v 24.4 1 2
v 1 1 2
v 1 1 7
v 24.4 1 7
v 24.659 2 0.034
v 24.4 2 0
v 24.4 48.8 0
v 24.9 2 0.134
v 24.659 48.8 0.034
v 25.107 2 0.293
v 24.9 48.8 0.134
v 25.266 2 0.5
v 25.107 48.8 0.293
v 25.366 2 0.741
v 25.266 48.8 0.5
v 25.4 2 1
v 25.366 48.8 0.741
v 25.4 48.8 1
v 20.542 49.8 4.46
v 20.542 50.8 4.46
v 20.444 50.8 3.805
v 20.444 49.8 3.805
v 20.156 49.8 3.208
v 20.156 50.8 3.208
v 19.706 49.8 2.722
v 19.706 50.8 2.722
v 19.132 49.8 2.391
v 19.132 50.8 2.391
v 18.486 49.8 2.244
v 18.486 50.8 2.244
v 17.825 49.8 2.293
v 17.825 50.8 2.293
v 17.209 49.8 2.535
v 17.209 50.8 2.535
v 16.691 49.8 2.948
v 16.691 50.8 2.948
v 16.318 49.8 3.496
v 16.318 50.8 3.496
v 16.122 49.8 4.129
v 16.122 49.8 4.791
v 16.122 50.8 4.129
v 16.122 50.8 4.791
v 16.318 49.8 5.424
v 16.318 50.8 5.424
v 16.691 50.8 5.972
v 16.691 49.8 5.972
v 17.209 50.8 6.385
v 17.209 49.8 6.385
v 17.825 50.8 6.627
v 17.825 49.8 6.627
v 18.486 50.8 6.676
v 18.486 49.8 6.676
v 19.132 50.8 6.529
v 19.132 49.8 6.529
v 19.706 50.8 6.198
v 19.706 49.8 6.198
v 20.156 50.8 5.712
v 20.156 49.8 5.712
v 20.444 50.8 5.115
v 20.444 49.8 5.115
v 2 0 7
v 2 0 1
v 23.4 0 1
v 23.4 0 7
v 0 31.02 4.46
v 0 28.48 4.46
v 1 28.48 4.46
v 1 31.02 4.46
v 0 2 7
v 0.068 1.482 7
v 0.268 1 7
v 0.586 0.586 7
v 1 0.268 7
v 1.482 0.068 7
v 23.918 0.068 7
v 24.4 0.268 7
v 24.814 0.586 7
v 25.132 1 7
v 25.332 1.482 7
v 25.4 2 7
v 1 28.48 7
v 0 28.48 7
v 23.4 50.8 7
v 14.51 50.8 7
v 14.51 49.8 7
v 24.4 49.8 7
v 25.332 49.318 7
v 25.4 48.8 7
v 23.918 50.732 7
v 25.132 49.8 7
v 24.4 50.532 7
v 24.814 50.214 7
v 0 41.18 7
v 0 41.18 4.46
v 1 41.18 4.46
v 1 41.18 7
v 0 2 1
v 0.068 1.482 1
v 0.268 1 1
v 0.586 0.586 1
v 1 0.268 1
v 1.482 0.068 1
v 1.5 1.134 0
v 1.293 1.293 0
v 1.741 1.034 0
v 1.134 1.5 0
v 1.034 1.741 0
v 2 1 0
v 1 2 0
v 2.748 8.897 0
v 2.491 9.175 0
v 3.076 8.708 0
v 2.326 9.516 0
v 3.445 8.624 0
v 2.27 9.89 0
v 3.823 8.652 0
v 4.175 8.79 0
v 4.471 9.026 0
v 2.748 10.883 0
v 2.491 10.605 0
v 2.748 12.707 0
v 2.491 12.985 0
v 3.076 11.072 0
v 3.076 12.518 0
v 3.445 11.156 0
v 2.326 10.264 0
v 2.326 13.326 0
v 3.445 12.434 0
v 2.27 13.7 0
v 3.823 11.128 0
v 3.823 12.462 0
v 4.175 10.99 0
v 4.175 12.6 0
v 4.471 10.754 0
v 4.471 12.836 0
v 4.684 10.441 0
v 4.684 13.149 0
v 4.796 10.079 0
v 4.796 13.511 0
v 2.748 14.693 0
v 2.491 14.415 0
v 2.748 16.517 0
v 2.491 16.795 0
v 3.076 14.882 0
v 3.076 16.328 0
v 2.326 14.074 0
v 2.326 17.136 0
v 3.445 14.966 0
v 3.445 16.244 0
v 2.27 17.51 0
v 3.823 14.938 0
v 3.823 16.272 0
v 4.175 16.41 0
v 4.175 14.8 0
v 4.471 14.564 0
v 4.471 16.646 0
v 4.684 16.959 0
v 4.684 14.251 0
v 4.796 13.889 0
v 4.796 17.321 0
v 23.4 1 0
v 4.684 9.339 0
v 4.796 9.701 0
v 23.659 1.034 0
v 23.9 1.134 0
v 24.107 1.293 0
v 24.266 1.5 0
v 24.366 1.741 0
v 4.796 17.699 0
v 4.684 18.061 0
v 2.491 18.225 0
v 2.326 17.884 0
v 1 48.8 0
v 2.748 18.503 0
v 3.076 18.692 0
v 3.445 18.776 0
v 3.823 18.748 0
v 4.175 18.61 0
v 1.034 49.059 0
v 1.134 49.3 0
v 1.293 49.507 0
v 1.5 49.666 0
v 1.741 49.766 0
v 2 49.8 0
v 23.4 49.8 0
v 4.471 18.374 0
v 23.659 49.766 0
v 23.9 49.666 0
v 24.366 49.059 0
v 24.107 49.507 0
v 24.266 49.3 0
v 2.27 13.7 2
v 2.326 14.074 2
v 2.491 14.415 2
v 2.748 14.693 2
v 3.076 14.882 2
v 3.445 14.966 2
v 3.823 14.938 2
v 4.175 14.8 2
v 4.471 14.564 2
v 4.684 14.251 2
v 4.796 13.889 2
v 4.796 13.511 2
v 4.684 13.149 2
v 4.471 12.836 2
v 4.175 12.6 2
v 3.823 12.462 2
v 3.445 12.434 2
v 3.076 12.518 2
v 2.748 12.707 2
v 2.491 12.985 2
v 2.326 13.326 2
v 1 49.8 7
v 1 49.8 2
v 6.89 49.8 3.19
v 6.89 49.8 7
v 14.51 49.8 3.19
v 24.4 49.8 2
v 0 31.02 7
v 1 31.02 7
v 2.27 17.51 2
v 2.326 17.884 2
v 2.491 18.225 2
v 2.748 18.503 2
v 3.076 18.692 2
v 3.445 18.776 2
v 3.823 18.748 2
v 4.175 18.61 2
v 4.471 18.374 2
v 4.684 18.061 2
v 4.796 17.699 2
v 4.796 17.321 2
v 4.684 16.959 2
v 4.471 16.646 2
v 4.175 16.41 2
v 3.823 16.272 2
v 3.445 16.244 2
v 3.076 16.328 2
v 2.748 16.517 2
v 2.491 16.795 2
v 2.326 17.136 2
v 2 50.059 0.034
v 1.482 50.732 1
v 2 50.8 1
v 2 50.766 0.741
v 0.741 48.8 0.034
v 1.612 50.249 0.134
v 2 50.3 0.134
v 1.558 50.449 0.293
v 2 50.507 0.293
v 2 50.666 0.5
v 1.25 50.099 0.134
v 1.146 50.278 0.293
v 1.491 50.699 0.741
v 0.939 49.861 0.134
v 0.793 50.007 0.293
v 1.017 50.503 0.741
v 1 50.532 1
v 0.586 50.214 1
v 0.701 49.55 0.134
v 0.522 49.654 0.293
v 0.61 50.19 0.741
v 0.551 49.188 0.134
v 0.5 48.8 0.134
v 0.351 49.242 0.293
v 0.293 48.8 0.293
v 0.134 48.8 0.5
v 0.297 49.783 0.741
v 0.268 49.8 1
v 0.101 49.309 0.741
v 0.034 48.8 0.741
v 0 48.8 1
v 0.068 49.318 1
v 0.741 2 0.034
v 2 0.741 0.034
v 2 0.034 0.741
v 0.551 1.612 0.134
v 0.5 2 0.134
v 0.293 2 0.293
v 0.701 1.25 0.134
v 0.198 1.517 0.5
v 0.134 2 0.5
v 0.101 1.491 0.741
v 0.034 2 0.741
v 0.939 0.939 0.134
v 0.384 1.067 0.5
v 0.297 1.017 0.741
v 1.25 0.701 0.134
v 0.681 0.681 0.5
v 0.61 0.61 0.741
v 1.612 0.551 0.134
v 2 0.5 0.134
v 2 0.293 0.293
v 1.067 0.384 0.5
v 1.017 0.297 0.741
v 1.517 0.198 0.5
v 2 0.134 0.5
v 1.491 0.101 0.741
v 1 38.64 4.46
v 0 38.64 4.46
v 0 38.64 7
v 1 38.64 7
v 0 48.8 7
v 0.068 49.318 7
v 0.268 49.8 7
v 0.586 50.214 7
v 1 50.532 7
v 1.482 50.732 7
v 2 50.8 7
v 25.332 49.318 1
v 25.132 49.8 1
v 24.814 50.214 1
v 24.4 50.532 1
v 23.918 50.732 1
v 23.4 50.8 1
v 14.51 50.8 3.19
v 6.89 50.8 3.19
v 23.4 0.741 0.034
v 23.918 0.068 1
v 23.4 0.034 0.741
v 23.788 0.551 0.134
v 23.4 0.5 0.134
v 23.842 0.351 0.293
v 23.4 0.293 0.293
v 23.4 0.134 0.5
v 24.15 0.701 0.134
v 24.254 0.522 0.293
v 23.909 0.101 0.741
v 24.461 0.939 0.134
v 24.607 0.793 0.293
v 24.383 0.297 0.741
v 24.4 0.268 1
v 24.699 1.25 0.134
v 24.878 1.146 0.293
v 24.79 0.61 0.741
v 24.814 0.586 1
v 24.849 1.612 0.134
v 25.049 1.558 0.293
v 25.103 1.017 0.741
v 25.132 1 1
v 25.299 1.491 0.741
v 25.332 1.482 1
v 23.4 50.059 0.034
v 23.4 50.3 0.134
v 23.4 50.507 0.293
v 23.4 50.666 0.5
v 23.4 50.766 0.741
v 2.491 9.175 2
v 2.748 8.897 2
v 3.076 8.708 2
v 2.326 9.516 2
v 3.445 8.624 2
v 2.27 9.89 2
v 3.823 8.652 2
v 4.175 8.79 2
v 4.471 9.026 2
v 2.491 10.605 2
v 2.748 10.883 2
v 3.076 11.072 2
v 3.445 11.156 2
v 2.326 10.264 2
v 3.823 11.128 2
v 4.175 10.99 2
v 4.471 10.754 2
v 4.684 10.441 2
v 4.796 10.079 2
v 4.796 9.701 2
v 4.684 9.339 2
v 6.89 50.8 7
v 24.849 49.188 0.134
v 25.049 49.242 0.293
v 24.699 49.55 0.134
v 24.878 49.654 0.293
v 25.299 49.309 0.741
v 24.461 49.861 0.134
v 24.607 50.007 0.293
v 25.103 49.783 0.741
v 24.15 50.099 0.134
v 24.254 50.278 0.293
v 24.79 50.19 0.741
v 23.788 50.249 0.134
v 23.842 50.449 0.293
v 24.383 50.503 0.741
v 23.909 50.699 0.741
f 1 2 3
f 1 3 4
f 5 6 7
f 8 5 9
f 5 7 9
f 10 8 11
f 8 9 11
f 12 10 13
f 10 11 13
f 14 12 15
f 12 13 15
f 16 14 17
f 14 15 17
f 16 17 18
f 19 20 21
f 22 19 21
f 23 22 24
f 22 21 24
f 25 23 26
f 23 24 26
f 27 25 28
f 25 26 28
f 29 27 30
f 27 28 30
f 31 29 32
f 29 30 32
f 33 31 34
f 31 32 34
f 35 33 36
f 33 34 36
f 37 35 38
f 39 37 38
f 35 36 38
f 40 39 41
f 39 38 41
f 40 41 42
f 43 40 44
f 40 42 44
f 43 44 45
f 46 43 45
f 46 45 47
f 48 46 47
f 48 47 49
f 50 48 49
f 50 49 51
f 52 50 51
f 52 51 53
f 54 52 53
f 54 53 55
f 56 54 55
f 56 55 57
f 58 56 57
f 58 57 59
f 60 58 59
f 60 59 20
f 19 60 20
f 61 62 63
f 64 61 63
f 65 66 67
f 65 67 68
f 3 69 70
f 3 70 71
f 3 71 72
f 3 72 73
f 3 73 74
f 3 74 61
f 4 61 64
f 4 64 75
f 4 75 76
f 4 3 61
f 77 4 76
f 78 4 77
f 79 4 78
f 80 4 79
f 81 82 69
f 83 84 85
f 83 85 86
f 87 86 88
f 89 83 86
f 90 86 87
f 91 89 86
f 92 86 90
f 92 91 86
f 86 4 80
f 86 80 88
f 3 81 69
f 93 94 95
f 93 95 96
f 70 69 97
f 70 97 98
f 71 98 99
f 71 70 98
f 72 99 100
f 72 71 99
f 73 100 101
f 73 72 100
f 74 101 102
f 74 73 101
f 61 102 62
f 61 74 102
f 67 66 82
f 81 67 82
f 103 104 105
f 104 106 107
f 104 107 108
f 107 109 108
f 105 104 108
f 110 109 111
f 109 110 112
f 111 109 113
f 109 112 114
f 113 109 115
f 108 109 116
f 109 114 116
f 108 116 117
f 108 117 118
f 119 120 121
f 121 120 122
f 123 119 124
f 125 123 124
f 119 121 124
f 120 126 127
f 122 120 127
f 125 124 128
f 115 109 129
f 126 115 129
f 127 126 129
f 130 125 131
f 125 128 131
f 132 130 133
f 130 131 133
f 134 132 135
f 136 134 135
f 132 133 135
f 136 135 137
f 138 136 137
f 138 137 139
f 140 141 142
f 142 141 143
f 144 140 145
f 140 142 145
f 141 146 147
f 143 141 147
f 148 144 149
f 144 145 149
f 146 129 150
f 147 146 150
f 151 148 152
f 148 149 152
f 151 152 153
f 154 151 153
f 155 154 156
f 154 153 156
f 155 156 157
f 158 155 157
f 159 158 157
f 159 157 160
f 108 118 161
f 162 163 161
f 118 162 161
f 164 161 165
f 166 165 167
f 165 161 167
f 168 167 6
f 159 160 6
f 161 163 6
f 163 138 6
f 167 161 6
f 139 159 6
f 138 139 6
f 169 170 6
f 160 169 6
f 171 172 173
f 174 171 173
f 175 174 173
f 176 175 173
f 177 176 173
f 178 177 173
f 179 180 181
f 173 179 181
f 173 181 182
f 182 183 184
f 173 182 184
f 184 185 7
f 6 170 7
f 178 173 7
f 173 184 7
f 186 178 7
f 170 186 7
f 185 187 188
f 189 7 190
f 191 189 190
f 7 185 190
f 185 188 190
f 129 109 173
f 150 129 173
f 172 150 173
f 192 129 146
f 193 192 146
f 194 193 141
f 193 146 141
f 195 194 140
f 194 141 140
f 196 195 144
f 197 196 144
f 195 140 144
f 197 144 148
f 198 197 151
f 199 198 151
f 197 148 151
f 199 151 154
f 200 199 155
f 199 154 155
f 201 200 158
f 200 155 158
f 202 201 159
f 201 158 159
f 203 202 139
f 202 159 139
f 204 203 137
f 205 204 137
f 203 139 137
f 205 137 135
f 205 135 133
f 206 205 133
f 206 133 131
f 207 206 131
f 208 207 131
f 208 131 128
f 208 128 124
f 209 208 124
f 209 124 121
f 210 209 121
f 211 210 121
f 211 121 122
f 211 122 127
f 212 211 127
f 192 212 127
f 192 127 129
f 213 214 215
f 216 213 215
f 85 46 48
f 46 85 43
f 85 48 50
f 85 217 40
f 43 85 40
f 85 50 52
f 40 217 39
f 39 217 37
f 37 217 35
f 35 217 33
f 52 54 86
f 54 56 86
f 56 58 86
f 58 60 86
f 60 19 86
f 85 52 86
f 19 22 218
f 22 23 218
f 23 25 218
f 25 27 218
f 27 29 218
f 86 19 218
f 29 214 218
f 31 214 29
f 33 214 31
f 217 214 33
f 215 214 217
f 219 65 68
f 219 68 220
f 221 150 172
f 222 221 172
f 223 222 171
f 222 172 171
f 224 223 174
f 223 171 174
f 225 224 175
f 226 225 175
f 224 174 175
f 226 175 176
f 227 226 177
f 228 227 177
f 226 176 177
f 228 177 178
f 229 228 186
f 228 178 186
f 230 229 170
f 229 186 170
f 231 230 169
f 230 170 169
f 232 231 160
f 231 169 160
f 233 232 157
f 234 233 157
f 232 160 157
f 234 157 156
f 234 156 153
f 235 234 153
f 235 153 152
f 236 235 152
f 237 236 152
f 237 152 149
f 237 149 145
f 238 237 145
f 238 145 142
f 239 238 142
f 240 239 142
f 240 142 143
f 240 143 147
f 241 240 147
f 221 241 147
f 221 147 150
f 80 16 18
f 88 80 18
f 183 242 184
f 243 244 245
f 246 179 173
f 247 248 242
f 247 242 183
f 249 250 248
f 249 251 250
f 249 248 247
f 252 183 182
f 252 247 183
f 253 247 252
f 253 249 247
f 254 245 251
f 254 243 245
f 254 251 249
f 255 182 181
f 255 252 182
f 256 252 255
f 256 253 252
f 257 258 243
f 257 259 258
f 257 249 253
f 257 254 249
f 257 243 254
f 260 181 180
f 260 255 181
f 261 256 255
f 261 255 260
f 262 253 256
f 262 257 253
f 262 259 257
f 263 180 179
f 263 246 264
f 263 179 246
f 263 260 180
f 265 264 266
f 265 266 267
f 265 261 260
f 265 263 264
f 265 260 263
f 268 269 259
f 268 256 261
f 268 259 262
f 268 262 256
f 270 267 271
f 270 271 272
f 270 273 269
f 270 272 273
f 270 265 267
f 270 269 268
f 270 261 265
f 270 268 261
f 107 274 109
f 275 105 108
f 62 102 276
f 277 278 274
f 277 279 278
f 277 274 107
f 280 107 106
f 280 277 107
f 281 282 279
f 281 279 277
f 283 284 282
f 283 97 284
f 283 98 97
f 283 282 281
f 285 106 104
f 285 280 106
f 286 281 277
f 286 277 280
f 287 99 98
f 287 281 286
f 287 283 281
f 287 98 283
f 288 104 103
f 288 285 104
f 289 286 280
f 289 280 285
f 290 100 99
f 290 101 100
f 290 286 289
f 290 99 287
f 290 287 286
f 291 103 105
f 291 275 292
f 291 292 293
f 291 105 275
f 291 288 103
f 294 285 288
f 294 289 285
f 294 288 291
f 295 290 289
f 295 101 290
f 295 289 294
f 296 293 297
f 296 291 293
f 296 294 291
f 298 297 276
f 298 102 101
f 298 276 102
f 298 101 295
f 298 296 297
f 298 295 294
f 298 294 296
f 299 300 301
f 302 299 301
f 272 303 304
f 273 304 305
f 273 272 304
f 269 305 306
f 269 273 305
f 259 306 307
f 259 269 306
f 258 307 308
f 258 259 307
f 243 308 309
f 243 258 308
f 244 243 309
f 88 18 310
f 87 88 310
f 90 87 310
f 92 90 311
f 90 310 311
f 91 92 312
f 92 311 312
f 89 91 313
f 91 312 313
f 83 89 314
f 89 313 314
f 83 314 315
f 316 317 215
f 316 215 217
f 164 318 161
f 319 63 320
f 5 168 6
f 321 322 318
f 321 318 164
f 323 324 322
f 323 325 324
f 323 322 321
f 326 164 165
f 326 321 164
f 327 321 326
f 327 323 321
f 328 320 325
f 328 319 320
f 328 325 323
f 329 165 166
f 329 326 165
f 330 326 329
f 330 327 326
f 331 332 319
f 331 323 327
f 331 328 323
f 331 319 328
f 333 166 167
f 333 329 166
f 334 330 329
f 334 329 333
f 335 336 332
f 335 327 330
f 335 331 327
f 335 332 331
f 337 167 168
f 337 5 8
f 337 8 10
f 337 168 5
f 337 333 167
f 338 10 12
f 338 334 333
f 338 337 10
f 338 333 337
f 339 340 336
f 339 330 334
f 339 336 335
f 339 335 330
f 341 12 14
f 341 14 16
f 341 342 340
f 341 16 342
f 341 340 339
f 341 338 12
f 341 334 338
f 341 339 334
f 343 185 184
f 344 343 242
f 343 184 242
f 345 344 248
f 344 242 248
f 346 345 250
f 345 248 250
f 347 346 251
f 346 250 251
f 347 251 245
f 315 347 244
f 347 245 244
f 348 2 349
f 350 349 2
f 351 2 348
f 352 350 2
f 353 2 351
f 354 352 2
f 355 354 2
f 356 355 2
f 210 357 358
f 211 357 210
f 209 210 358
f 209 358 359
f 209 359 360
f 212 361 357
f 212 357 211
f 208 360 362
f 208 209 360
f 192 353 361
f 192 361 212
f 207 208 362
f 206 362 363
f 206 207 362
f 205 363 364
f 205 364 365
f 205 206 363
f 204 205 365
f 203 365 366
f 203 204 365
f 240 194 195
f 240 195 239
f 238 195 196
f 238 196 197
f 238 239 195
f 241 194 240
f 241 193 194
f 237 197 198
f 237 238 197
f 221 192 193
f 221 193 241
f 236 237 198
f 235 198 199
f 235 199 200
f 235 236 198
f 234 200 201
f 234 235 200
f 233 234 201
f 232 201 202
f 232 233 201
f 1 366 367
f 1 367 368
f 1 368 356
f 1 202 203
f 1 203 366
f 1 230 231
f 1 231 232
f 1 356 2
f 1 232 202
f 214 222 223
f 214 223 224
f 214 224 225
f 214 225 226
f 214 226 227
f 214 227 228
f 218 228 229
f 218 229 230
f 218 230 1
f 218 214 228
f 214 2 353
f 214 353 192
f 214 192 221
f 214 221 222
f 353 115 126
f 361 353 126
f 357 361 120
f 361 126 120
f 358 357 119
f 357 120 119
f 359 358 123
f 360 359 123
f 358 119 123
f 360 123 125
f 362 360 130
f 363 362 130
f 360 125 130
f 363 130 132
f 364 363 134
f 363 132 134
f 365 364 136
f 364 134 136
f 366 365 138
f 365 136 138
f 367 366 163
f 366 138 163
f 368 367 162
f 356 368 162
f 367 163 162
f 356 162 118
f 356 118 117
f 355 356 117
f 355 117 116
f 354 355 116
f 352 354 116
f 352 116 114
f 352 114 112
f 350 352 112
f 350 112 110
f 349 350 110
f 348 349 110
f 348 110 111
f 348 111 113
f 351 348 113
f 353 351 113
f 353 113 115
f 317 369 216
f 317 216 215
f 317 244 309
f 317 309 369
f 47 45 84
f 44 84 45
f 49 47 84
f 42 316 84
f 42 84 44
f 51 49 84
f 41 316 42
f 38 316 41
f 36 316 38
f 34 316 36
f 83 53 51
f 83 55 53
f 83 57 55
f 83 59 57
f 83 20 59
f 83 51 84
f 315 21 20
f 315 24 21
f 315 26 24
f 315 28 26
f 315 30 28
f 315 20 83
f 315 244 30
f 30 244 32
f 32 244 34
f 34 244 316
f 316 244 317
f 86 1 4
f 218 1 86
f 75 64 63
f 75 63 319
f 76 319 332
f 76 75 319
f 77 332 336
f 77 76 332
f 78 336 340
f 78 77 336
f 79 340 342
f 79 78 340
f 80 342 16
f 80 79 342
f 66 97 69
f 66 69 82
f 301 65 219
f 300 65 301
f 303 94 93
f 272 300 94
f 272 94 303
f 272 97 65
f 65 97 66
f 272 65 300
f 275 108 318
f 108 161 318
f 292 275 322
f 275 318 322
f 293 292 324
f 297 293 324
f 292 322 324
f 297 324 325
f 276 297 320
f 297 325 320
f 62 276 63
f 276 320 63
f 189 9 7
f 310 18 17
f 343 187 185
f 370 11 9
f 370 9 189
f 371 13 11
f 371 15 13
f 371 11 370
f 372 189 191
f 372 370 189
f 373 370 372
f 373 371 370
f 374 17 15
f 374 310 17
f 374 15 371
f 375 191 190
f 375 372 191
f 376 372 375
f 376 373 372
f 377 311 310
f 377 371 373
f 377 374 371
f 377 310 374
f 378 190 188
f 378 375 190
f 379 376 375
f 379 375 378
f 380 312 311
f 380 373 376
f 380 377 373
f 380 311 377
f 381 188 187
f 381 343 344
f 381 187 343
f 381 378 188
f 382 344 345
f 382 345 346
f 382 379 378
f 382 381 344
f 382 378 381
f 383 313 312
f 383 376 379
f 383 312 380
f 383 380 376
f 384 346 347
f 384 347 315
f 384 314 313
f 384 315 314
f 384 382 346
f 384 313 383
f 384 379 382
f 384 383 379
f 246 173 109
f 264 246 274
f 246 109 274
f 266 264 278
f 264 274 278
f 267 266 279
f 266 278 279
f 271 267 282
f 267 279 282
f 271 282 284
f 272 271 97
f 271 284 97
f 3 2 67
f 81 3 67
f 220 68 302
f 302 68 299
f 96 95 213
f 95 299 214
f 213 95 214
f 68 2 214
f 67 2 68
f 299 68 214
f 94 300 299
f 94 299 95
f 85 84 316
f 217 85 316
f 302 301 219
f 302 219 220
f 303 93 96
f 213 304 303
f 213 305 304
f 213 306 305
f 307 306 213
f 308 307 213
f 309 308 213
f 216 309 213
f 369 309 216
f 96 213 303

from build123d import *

# Parameters (mm, degrees)
SKETCH1_W           = 25.4
SKETCH1_H           = 50.8
BOSS_EXTRUDE1_DEPTH = 2.00000108
SKETCH2_W           = 25.4
SKETCH2_H           = 50.8
SKETCH2_W_2         = 23.39999892
SKETCH2_H_2         = 48.79999892
BOSS_EXTRUDE2_DEPTH = 4.999999906
FILLET1_R           = 2.000000064
FILLET2_R           = 1.000000032
CUT_EXTRUDE3_REACH  = 52.8
SKETCH6_R           = 2.2225
CUT_EXTRUDE4_REACH  = 52.8
SKETCH7_W           = 7.62
SKETCH7_H           = 3.81
CUT_EXTRUDE5_REACH  = 27.4
SKETCH8_W           = 2.54
SKETCH8_H           = 2.54
CUT_EXTRUDE6_REACH  = 9
SKETCH9_R           = 1.27


with BuildPart() as part:
    # Sketch1 → Boss-Extrude1 (new body)
    with BuildSketch(Plane.XY):
        with Locations((12.7, 25.4)):
            Rectangle(SKETCH1_W, SKETCH1_H)
    extrude(amount=BOSS_EXTRUDE1_DEPTH)

    # Sketch2 → Boss-Extrude2 (add)
    with BuildSketch(Plane.XY.offset(2.00000108)):
        with Locations((12.7, 25.4)):
            Rectangle(SKETCH2_W, SKETCH2_H)
        with Locations((12.7, 25.4)):
            Rectangle(SKETCH2_W_2, SKETCH2_H_2, mode=Mode.SUBTRACT)
    extrude(amount=BOSS_EXTRUDE2_DEPTH)

    # Fillet1
    fillet1_edges = [part.edges().sort_by_distance(p)[0] for p in [
        (0, 50.8, 3.500000493),
        (25.4, 50.8, 3.500000493),
        (25.4, 0, 3.500000493),
        (0, 0, 3.500000493),
    ]]
    fillet(fillet1_edges, radius=FILLET1_R)

    # Fillet2
    fillet2_edges = [part.edges().sort_by_distance(p)[0] for p in [
        (12.7, 0, 0),
        (0, 25.4, 0),
        (12.7, 50.8, 0),
        (25.4, 25.4, 0),
        (24.814213544, 50.214213544, 0),
        (0.585786456, 50.214213544, 0),
        (24.814213544, 0.585786456, 0),
        (0.585786456, 0.585786456, 0),
    ]]
    fillet(fillet2_edges, radius=FILLET2_R)

    # Sketch6 → Cut-Extrude3 (cut, up to next)
    with BuildSketch(Plane(origin=(0, 50.8, 0), x_dir=(1, 0, 0), z_dir=(0, 1, 0)), mode=Mode.PRIVATE) as cut_extrude3_sk1:
        with Locations((18.319999936, -4.460000986)):
            Circle(SKETCH6_R)
    cut_extrude3_tool1 = extrude(cut_extrude3_sk1.sketch, amount=-CUT_EXTRUDE3_REACH, mode=Mode.PRIVATE) & part.part
    add(cut_extrude3_tool1.solids().sort_by_distance((18.32, 50.8, 4.460001))[0], mode=Mode.SUBTRACT)

    # Sketch7 → Cut-Extrude4 (cut, up to next)
    with BuildSketch(Plane(origin=(0, 50.8, 0), x_dir=(1, 0, 0), z_dir=(0, 1, 0)), mode=Mode.PRIVATE) as cut_extrude4_sk1:
        with Locations((10.699999936, -5.095000986)):
            Rectangle(SKETCH7_W, SKETCH7_H)
    cut_extrude4_tool1 = extrude(cut_extrude4_sk1.sketch, amount=-CUT_EXTRUDE4_REACH, mode=Mode.PRIVATE) & part.part
    add(cut_extrude4_tool1.solids().sort_by_distance((10.7, 50.8, 5.095001))[0], mode=Mode.SUBTRACT)

    # Sketch8 → Cut-Extrude5 (cut, up to next)
    with BuildSketch(Plane.ZY, mode=Mode.PRIVATE) as cut_extrude5_sk1:
        with Locations((5.730000986, 39.909999936)):
            Rectangle(SKETCH8_W, SKETCH8_H)
    cut_extrude5_tool1 = extrude(cut_extrude5_sk1.sketch, amount=-CUT_EXTRUDE5_REACH, mode=Mode.PRIVATE) & part.part
    add(cut_extrude5_tool1.solids().sort_by_distance((0, 39.91, 5.730001))[0], mode=Mode.SUBTRACT)
    # Sketch8 → Cut-Extrude5 (cut, up to next)
    with BuildSketch(Plane.ZY, mode=Mode.PRIVATE) as cut_extrude5_sk2:
        with Locations((5.730000986, 29.749999936)):
            Rectangle(SKETCH8_W, SKETCH8_H)
    cut_extrude5_tool2 = extrude(cut_extrude5_sk2.sketch, amount=-CUT_EXTRUDE5_REACH, mode=Mode.PRIVATE) & part.part
    add(cut_extrude5_tool2.solids().sort_by_distance((0, 29.75, 5.730001))[0], mode=Mode.SUBTRACT)

    # Sketch9 → Cut-Extrude6 (cut, up to next)
    with BuildSketch(Plane(origin=(0, 0, 0), x_dir=(-1, 0, 0), z_dir=(0, 0, -1)), mode=Mode.PRIVATE) as cut_extrude6_sk1:
        with Locations((-3.540000032, 9.890000032)):
            Circle(SKETCH9_R)
    cut_extrude6_tool1 = extrude(cut_extrude6_sk1.sketch, amount=-CUT_EXTRUDE6_REACH, mode=Mode.PRIVATE) & part.part
    add(cut_extrude6_tool1.solids().sort_by_distance((3.54, 9.89, 0))[0], mode=Mode.SUBTRACT)
    # Sketch9 → Cut-Extrude6 (cut, up to next)
    with BuildSketch(Plane(origin=(0, 0, 0), x_dir=(-1, 0, 0), z_dir=(0, 0, -1)), mode=Mode.PRIVATE) as cut_extrude6_sk2:
        with Locations((-3.540000032, 13.700000032)):
            Circle(SKETCH9_R)
    cut_extrude6_tool2 = extrude(cut_extrude6_sk2.sketch, amount=-CUT_EXTRUDE6_REACH, mode=Mode.PRIVATE) & part.part
    add(cut_extrude6_tool2.solids().sort_by_distance((3.54, 13.7, 0))[0], mode=Mode.SUBTRACT)
    # Sketch9 → Cut-Extrude6 (cut, up to next)
    with BuildSketch(Plane(origin=(0, 0, 0), x_dir=(-1, 0, 0), z_dir=(0, 0, -1)), mode=Mode.PRIVATE) as cut_extrude6_sk3:
        with Locations((-3.540000032, 17.510000032)):
            Circle(SKETCH9_R)
    cut_extrude6_tool3 = extrude(cut_extrude6_sk3.sketch, amount=-CUT_EXTRUDE6_REACH, mode=Mode.PRIVATE) & part.part
    add(cut_extrude6_tool3.solids().sort_by_distance((3.54, 17.51, 0))[0], mode=Mode.SUBTRACT)


solid = part.part
